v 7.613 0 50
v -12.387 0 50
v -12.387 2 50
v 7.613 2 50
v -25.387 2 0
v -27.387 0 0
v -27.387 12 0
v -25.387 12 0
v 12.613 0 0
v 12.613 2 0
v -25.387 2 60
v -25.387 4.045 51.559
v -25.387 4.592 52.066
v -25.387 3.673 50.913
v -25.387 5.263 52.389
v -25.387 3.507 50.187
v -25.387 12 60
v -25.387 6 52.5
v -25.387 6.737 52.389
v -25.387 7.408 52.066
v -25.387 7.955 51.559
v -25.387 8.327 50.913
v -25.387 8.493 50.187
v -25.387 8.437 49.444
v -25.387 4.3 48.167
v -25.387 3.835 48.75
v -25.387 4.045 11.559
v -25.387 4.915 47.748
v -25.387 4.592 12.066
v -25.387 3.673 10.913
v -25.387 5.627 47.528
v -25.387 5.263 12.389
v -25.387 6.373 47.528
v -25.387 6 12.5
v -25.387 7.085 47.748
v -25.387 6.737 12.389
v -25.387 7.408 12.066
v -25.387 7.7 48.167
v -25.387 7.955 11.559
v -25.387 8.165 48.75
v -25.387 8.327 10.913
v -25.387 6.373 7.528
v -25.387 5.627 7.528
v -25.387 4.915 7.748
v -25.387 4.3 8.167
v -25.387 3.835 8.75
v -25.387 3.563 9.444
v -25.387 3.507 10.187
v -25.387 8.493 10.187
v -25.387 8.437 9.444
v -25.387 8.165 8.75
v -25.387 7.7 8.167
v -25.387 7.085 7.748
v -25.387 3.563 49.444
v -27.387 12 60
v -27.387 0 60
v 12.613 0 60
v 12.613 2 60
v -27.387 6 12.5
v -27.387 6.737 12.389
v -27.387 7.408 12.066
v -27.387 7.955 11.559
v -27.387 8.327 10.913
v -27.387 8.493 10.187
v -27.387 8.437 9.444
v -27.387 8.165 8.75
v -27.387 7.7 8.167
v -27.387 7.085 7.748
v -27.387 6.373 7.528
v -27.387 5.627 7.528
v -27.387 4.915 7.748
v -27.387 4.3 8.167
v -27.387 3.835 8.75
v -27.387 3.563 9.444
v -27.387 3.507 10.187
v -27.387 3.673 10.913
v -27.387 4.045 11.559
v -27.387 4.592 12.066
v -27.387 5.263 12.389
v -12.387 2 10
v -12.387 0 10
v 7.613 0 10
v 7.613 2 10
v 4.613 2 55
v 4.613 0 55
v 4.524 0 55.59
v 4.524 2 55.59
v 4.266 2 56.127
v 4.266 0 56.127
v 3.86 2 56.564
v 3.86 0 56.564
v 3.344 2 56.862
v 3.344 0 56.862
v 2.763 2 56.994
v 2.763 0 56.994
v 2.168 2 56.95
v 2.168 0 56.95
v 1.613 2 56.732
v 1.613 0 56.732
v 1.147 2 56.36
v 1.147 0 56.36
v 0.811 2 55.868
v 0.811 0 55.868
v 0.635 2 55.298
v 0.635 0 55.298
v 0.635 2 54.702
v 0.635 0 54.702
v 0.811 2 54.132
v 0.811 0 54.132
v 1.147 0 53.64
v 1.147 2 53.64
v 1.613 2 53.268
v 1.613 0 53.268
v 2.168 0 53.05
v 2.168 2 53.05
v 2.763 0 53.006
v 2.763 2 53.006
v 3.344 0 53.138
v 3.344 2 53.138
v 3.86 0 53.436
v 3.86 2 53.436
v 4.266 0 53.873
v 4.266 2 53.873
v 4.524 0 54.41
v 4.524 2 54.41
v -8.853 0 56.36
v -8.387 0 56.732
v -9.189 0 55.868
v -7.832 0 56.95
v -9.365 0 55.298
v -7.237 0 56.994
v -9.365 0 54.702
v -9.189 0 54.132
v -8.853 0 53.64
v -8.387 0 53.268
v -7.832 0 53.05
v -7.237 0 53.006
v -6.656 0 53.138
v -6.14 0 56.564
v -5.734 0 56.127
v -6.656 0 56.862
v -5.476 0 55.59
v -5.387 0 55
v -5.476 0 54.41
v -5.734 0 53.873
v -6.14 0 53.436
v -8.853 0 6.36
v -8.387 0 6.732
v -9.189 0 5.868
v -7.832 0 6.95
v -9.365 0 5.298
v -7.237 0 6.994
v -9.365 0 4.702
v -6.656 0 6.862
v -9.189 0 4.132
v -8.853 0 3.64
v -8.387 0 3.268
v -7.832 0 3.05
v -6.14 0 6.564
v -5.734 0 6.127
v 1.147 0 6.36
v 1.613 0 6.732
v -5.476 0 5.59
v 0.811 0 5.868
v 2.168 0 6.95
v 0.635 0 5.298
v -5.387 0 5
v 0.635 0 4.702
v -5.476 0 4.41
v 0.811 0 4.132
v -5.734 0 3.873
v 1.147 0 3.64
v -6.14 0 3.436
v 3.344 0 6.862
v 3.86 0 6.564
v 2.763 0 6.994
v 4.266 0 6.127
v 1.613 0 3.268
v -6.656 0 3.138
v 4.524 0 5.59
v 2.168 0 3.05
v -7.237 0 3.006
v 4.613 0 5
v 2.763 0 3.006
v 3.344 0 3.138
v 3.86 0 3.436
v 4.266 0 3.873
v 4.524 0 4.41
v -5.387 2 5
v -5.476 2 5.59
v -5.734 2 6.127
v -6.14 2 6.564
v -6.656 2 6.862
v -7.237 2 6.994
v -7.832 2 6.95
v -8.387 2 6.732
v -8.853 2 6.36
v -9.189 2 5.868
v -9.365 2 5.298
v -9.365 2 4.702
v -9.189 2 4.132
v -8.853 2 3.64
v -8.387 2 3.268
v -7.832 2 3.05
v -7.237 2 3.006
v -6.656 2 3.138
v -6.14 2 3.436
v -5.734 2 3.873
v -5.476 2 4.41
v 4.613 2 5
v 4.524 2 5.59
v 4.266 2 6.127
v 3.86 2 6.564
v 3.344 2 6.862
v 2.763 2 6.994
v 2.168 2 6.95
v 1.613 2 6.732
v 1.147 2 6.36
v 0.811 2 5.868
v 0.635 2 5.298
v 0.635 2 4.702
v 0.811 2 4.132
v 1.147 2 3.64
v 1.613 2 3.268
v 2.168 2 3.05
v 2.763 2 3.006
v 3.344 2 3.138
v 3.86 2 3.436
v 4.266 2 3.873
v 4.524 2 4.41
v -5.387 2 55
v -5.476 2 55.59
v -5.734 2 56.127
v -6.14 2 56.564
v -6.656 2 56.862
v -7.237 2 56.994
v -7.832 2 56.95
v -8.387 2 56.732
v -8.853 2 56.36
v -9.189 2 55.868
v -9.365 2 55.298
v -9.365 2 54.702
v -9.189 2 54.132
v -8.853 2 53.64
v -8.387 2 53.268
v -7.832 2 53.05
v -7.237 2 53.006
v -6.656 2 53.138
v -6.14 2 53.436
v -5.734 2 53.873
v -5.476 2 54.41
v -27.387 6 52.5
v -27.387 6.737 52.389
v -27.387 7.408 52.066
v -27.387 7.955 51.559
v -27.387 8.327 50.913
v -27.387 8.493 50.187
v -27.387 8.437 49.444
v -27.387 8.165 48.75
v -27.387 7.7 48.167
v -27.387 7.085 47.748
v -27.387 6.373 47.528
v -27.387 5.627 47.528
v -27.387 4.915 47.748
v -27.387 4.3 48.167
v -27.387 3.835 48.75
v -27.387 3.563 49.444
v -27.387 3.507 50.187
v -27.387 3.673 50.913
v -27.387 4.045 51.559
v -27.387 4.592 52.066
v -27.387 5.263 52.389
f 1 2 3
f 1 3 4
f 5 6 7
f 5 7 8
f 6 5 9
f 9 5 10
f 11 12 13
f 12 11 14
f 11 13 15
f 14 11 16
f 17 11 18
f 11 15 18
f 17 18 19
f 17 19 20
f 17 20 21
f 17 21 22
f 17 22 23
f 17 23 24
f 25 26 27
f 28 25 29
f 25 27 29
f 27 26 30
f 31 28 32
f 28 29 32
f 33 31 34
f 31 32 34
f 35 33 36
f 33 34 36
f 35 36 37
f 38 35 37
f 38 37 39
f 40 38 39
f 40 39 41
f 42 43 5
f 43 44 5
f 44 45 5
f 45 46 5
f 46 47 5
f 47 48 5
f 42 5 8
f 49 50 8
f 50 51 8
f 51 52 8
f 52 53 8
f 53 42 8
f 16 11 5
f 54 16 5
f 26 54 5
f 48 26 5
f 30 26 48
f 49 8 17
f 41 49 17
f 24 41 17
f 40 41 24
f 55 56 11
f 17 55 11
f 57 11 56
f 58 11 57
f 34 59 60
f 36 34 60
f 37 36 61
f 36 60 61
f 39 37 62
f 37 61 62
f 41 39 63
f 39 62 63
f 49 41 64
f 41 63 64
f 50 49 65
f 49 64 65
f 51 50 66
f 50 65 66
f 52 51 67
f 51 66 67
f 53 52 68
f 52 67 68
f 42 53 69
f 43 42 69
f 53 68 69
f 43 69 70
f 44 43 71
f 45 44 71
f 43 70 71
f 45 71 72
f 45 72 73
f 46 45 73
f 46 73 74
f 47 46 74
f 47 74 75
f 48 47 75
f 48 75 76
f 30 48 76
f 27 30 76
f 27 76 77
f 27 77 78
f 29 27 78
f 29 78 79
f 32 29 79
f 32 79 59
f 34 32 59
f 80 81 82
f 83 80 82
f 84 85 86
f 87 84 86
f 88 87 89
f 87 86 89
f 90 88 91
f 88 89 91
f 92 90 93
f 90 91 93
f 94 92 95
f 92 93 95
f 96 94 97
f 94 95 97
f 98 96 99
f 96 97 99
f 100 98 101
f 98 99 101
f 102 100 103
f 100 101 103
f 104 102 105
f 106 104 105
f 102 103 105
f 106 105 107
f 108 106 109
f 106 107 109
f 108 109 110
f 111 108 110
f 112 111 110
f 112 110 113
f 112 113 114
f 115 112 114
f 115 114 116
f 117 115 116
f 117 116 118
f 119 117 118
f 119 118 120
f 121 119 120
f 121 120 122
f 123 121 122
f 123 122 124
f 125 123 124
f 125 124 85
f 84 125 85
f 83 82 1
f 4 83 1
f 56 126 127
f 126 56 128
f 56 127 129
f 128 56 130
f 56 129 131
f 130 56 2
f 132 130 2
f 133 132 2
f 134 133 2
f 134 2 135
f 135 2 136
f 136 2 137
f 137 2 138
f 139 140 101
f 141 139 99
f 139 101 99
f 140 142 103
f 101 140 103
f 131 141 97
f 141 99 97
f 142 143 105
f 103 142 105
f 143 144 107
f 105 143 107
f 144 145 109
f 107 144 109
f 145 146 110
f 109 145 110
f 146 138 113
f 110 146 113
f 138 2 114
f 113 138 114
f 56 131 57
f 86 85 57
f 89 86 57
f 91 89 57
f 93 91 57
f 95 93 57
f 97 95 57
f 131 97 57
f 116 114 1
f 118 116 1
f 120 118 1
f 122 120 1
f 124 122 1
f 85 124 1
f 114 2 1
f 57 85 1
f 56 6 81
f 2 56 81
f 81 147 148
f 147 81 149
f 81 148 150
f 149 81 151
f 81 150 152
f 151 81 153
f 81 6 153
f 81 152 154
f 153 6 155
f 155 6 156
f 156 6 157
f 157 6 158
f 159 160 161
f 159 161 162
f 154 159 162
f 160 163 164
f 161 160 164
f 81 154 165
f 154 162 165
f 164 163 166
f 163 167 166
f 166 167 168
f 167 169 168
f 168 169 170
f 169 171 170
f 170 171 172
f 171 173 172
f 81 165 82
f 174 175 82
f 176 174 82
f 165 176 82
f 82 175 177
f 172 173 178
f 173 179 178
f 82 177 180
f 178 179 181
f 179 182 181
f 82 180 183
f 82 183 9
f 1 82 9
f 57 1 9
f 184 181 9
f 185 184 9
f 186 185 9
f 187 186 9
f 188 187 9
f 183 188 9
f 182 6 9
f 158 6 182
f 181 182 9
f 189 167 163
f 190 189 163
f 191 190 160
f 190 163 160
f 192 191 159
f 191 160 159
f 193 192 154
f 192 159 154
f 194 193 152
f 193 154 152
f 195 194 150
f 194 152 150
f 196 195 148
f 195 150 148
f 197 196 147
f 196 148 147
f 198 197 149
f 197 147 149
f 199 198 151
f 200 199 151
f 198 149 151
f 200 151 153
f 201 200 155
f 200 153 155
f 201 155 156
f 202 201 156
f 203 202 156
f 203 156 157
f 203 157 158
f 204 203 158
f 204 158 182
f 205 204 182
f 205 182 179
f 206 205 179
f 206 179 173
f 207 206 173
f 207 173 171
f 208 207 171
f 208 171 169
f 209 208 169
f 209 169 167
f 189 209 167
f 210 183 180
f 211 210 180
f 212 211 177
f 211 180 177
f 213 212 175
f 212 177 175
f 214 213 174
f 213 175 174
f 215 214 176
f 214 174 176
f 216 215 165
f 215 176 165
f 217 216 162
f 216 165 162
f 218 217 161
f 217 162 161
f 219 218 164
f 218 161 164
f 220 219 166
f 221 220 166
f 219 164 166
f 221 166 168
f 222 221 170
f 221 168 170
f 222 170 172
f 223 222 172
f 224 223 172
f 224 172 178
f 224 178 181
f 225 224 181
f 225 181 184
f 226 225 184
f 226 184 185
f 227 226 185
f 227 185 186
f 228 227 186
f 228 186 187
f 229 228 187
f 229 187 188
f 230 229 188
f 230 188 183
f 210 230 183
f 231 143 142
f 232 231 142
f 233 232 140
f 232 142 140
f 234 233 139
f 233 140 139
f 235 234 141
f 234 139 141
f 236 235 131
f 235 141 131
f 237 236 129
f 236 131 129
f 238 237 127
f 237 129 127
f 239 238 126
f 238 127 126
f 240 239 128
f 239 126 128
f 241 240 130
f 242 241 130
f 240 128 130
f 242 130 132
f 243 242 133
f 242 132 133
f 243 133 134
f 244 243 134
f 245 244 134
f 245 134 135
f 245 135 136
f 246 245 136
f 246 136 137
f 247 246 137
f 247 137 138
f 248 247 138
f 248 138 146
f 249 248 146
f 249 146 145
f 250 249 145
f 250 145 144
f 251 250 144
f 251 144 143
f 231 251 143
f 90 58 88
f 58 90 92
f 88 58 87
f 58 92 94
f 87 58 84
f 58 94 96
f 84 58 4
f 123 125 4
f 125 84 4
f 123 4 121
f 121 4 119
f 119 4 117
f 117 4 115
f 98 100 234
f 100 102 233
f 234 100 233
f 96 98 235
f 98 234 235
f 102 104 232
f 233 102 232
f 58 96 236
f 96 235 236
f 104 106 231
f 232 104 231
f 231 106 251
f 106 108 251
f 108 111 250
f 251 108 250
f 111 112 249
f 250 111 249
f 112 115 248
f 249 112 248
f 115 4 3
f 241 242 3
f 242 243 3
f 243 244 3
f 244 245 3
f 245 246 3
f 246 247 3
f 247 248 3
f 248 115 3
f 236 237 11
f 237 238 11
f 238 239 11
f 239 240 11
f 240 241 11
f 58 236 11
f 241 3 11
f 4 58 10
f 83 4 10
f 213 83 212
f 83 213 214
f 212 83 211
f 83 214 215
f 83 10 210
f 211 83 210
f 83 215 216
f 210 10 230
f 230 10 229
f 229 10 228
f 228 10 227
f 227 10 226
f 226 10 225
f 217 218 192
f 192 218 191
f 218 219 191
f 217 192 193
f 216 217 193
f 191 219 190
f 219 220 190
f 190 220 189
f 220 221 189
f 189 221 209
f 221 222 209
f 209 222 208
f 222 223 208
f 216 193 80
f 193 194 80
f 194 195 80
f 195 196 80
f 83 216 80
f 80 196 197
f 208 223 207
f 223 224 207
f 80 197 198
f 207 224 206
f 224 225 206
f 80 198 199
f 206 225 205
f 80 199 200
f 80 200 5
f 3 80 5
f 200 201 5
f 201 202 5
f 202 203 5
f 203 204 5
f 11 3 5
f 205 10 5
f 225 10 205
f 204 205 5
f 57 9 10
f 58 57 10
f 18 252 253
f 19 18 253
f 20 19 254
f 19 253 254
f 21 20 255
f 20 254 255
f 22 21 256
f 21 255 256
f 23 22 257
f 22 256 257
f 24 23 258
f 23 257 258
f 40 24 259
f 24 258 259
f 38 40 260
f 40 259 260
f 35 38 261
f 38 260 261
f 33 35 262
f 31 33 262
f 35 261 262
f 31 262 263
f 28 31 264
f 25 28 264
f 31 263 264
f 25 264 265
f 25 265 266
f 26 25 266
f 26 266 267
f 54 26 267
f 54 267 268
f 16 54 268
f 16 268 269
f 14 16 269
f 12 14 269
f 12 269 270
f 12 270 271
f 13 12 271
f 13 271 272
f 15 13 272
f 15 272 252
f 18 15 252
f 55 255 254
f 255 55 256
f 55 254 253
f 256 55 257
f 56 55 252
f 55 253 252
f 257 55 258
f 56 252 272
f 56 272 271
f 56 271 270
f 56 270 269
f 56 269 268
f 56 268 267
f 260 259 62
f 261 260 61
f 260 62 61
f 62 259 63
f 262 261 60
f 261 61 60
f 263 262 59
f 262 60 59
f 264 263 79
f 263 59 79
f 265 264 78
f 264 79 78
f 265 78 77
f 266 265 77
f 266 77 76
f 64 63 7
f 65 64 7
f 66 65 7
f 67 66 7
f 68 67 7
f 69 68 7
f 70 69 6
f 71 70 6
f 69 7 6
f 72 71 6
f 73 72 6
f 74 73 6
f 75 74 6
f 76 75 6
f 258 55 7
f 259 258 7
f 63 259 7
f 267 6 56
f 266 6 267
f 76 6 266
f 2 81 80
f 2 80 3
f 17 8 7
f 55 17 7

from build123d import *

# Parameters (mm, degrees)
SALIENTE_EXTRUIR1_DEPTH = 60
CROQUIS3_R              = 2.5
CORTAR_EXTRUIR1_DEPTH   = 60
CROQUIS4_R              = 2
CROQUIS4_W              = 20
CROQUIS4_H              = 40
CORTAR_EXTRUIR2_DEPTH   = 60


with BuildPart() as part:
    # Croquis2 → Saliente-Extruir1 (new body)
    with BuildSketch(Plane.XY):
        Polygon((-27.386914876, 0), (12.613085124, 0), (12.613085124, 2), (-25.386914876, 2), (-25.386914876, 12), (-27.386914876, 12), align=None)
    extrude(amount=SALIENTE_EXTRUIR1_DEPTH)

    # Croquis3 → Cortar-Extruir1 (cut)
    with BuildSketch(Plane.ZY.offset(27.386914876)):
        with Locations((10, 6)):
            Circle(CROQUIS3_R)
        with Locations((50, 6)):
            Circle(CROQUIS3_R)
    extrude(amount=-CORTAR_EXTRUIR1_DEPTH, mode=Mode.SUBTRACT)

    # Croquis4 → Cortar-Extruir2 (cut)
    with BuildSketch(Plane.XZ):
        with Locations((-7.386914876, 55)):
            Circle(CROQUIS4_R)
        with Locations((2.613085124, 55)):
            Circle(CROQUIS4_R)
        with Locations((-7.386914876, 5)):
            Circle(CROQUIS4_R)
        with Locations((2.613085124, 5)):
            Circle(CROQUIS4_R)
        with Locations((-2.386914876, 30)):
            Rectangle(CROQUIS4_W, CROQUIS4_H)
    extrude(amount=-CORTAR_EXTRUIR2_DEPTH, mode=Mode.SUBTRACT)


solid = part.part
